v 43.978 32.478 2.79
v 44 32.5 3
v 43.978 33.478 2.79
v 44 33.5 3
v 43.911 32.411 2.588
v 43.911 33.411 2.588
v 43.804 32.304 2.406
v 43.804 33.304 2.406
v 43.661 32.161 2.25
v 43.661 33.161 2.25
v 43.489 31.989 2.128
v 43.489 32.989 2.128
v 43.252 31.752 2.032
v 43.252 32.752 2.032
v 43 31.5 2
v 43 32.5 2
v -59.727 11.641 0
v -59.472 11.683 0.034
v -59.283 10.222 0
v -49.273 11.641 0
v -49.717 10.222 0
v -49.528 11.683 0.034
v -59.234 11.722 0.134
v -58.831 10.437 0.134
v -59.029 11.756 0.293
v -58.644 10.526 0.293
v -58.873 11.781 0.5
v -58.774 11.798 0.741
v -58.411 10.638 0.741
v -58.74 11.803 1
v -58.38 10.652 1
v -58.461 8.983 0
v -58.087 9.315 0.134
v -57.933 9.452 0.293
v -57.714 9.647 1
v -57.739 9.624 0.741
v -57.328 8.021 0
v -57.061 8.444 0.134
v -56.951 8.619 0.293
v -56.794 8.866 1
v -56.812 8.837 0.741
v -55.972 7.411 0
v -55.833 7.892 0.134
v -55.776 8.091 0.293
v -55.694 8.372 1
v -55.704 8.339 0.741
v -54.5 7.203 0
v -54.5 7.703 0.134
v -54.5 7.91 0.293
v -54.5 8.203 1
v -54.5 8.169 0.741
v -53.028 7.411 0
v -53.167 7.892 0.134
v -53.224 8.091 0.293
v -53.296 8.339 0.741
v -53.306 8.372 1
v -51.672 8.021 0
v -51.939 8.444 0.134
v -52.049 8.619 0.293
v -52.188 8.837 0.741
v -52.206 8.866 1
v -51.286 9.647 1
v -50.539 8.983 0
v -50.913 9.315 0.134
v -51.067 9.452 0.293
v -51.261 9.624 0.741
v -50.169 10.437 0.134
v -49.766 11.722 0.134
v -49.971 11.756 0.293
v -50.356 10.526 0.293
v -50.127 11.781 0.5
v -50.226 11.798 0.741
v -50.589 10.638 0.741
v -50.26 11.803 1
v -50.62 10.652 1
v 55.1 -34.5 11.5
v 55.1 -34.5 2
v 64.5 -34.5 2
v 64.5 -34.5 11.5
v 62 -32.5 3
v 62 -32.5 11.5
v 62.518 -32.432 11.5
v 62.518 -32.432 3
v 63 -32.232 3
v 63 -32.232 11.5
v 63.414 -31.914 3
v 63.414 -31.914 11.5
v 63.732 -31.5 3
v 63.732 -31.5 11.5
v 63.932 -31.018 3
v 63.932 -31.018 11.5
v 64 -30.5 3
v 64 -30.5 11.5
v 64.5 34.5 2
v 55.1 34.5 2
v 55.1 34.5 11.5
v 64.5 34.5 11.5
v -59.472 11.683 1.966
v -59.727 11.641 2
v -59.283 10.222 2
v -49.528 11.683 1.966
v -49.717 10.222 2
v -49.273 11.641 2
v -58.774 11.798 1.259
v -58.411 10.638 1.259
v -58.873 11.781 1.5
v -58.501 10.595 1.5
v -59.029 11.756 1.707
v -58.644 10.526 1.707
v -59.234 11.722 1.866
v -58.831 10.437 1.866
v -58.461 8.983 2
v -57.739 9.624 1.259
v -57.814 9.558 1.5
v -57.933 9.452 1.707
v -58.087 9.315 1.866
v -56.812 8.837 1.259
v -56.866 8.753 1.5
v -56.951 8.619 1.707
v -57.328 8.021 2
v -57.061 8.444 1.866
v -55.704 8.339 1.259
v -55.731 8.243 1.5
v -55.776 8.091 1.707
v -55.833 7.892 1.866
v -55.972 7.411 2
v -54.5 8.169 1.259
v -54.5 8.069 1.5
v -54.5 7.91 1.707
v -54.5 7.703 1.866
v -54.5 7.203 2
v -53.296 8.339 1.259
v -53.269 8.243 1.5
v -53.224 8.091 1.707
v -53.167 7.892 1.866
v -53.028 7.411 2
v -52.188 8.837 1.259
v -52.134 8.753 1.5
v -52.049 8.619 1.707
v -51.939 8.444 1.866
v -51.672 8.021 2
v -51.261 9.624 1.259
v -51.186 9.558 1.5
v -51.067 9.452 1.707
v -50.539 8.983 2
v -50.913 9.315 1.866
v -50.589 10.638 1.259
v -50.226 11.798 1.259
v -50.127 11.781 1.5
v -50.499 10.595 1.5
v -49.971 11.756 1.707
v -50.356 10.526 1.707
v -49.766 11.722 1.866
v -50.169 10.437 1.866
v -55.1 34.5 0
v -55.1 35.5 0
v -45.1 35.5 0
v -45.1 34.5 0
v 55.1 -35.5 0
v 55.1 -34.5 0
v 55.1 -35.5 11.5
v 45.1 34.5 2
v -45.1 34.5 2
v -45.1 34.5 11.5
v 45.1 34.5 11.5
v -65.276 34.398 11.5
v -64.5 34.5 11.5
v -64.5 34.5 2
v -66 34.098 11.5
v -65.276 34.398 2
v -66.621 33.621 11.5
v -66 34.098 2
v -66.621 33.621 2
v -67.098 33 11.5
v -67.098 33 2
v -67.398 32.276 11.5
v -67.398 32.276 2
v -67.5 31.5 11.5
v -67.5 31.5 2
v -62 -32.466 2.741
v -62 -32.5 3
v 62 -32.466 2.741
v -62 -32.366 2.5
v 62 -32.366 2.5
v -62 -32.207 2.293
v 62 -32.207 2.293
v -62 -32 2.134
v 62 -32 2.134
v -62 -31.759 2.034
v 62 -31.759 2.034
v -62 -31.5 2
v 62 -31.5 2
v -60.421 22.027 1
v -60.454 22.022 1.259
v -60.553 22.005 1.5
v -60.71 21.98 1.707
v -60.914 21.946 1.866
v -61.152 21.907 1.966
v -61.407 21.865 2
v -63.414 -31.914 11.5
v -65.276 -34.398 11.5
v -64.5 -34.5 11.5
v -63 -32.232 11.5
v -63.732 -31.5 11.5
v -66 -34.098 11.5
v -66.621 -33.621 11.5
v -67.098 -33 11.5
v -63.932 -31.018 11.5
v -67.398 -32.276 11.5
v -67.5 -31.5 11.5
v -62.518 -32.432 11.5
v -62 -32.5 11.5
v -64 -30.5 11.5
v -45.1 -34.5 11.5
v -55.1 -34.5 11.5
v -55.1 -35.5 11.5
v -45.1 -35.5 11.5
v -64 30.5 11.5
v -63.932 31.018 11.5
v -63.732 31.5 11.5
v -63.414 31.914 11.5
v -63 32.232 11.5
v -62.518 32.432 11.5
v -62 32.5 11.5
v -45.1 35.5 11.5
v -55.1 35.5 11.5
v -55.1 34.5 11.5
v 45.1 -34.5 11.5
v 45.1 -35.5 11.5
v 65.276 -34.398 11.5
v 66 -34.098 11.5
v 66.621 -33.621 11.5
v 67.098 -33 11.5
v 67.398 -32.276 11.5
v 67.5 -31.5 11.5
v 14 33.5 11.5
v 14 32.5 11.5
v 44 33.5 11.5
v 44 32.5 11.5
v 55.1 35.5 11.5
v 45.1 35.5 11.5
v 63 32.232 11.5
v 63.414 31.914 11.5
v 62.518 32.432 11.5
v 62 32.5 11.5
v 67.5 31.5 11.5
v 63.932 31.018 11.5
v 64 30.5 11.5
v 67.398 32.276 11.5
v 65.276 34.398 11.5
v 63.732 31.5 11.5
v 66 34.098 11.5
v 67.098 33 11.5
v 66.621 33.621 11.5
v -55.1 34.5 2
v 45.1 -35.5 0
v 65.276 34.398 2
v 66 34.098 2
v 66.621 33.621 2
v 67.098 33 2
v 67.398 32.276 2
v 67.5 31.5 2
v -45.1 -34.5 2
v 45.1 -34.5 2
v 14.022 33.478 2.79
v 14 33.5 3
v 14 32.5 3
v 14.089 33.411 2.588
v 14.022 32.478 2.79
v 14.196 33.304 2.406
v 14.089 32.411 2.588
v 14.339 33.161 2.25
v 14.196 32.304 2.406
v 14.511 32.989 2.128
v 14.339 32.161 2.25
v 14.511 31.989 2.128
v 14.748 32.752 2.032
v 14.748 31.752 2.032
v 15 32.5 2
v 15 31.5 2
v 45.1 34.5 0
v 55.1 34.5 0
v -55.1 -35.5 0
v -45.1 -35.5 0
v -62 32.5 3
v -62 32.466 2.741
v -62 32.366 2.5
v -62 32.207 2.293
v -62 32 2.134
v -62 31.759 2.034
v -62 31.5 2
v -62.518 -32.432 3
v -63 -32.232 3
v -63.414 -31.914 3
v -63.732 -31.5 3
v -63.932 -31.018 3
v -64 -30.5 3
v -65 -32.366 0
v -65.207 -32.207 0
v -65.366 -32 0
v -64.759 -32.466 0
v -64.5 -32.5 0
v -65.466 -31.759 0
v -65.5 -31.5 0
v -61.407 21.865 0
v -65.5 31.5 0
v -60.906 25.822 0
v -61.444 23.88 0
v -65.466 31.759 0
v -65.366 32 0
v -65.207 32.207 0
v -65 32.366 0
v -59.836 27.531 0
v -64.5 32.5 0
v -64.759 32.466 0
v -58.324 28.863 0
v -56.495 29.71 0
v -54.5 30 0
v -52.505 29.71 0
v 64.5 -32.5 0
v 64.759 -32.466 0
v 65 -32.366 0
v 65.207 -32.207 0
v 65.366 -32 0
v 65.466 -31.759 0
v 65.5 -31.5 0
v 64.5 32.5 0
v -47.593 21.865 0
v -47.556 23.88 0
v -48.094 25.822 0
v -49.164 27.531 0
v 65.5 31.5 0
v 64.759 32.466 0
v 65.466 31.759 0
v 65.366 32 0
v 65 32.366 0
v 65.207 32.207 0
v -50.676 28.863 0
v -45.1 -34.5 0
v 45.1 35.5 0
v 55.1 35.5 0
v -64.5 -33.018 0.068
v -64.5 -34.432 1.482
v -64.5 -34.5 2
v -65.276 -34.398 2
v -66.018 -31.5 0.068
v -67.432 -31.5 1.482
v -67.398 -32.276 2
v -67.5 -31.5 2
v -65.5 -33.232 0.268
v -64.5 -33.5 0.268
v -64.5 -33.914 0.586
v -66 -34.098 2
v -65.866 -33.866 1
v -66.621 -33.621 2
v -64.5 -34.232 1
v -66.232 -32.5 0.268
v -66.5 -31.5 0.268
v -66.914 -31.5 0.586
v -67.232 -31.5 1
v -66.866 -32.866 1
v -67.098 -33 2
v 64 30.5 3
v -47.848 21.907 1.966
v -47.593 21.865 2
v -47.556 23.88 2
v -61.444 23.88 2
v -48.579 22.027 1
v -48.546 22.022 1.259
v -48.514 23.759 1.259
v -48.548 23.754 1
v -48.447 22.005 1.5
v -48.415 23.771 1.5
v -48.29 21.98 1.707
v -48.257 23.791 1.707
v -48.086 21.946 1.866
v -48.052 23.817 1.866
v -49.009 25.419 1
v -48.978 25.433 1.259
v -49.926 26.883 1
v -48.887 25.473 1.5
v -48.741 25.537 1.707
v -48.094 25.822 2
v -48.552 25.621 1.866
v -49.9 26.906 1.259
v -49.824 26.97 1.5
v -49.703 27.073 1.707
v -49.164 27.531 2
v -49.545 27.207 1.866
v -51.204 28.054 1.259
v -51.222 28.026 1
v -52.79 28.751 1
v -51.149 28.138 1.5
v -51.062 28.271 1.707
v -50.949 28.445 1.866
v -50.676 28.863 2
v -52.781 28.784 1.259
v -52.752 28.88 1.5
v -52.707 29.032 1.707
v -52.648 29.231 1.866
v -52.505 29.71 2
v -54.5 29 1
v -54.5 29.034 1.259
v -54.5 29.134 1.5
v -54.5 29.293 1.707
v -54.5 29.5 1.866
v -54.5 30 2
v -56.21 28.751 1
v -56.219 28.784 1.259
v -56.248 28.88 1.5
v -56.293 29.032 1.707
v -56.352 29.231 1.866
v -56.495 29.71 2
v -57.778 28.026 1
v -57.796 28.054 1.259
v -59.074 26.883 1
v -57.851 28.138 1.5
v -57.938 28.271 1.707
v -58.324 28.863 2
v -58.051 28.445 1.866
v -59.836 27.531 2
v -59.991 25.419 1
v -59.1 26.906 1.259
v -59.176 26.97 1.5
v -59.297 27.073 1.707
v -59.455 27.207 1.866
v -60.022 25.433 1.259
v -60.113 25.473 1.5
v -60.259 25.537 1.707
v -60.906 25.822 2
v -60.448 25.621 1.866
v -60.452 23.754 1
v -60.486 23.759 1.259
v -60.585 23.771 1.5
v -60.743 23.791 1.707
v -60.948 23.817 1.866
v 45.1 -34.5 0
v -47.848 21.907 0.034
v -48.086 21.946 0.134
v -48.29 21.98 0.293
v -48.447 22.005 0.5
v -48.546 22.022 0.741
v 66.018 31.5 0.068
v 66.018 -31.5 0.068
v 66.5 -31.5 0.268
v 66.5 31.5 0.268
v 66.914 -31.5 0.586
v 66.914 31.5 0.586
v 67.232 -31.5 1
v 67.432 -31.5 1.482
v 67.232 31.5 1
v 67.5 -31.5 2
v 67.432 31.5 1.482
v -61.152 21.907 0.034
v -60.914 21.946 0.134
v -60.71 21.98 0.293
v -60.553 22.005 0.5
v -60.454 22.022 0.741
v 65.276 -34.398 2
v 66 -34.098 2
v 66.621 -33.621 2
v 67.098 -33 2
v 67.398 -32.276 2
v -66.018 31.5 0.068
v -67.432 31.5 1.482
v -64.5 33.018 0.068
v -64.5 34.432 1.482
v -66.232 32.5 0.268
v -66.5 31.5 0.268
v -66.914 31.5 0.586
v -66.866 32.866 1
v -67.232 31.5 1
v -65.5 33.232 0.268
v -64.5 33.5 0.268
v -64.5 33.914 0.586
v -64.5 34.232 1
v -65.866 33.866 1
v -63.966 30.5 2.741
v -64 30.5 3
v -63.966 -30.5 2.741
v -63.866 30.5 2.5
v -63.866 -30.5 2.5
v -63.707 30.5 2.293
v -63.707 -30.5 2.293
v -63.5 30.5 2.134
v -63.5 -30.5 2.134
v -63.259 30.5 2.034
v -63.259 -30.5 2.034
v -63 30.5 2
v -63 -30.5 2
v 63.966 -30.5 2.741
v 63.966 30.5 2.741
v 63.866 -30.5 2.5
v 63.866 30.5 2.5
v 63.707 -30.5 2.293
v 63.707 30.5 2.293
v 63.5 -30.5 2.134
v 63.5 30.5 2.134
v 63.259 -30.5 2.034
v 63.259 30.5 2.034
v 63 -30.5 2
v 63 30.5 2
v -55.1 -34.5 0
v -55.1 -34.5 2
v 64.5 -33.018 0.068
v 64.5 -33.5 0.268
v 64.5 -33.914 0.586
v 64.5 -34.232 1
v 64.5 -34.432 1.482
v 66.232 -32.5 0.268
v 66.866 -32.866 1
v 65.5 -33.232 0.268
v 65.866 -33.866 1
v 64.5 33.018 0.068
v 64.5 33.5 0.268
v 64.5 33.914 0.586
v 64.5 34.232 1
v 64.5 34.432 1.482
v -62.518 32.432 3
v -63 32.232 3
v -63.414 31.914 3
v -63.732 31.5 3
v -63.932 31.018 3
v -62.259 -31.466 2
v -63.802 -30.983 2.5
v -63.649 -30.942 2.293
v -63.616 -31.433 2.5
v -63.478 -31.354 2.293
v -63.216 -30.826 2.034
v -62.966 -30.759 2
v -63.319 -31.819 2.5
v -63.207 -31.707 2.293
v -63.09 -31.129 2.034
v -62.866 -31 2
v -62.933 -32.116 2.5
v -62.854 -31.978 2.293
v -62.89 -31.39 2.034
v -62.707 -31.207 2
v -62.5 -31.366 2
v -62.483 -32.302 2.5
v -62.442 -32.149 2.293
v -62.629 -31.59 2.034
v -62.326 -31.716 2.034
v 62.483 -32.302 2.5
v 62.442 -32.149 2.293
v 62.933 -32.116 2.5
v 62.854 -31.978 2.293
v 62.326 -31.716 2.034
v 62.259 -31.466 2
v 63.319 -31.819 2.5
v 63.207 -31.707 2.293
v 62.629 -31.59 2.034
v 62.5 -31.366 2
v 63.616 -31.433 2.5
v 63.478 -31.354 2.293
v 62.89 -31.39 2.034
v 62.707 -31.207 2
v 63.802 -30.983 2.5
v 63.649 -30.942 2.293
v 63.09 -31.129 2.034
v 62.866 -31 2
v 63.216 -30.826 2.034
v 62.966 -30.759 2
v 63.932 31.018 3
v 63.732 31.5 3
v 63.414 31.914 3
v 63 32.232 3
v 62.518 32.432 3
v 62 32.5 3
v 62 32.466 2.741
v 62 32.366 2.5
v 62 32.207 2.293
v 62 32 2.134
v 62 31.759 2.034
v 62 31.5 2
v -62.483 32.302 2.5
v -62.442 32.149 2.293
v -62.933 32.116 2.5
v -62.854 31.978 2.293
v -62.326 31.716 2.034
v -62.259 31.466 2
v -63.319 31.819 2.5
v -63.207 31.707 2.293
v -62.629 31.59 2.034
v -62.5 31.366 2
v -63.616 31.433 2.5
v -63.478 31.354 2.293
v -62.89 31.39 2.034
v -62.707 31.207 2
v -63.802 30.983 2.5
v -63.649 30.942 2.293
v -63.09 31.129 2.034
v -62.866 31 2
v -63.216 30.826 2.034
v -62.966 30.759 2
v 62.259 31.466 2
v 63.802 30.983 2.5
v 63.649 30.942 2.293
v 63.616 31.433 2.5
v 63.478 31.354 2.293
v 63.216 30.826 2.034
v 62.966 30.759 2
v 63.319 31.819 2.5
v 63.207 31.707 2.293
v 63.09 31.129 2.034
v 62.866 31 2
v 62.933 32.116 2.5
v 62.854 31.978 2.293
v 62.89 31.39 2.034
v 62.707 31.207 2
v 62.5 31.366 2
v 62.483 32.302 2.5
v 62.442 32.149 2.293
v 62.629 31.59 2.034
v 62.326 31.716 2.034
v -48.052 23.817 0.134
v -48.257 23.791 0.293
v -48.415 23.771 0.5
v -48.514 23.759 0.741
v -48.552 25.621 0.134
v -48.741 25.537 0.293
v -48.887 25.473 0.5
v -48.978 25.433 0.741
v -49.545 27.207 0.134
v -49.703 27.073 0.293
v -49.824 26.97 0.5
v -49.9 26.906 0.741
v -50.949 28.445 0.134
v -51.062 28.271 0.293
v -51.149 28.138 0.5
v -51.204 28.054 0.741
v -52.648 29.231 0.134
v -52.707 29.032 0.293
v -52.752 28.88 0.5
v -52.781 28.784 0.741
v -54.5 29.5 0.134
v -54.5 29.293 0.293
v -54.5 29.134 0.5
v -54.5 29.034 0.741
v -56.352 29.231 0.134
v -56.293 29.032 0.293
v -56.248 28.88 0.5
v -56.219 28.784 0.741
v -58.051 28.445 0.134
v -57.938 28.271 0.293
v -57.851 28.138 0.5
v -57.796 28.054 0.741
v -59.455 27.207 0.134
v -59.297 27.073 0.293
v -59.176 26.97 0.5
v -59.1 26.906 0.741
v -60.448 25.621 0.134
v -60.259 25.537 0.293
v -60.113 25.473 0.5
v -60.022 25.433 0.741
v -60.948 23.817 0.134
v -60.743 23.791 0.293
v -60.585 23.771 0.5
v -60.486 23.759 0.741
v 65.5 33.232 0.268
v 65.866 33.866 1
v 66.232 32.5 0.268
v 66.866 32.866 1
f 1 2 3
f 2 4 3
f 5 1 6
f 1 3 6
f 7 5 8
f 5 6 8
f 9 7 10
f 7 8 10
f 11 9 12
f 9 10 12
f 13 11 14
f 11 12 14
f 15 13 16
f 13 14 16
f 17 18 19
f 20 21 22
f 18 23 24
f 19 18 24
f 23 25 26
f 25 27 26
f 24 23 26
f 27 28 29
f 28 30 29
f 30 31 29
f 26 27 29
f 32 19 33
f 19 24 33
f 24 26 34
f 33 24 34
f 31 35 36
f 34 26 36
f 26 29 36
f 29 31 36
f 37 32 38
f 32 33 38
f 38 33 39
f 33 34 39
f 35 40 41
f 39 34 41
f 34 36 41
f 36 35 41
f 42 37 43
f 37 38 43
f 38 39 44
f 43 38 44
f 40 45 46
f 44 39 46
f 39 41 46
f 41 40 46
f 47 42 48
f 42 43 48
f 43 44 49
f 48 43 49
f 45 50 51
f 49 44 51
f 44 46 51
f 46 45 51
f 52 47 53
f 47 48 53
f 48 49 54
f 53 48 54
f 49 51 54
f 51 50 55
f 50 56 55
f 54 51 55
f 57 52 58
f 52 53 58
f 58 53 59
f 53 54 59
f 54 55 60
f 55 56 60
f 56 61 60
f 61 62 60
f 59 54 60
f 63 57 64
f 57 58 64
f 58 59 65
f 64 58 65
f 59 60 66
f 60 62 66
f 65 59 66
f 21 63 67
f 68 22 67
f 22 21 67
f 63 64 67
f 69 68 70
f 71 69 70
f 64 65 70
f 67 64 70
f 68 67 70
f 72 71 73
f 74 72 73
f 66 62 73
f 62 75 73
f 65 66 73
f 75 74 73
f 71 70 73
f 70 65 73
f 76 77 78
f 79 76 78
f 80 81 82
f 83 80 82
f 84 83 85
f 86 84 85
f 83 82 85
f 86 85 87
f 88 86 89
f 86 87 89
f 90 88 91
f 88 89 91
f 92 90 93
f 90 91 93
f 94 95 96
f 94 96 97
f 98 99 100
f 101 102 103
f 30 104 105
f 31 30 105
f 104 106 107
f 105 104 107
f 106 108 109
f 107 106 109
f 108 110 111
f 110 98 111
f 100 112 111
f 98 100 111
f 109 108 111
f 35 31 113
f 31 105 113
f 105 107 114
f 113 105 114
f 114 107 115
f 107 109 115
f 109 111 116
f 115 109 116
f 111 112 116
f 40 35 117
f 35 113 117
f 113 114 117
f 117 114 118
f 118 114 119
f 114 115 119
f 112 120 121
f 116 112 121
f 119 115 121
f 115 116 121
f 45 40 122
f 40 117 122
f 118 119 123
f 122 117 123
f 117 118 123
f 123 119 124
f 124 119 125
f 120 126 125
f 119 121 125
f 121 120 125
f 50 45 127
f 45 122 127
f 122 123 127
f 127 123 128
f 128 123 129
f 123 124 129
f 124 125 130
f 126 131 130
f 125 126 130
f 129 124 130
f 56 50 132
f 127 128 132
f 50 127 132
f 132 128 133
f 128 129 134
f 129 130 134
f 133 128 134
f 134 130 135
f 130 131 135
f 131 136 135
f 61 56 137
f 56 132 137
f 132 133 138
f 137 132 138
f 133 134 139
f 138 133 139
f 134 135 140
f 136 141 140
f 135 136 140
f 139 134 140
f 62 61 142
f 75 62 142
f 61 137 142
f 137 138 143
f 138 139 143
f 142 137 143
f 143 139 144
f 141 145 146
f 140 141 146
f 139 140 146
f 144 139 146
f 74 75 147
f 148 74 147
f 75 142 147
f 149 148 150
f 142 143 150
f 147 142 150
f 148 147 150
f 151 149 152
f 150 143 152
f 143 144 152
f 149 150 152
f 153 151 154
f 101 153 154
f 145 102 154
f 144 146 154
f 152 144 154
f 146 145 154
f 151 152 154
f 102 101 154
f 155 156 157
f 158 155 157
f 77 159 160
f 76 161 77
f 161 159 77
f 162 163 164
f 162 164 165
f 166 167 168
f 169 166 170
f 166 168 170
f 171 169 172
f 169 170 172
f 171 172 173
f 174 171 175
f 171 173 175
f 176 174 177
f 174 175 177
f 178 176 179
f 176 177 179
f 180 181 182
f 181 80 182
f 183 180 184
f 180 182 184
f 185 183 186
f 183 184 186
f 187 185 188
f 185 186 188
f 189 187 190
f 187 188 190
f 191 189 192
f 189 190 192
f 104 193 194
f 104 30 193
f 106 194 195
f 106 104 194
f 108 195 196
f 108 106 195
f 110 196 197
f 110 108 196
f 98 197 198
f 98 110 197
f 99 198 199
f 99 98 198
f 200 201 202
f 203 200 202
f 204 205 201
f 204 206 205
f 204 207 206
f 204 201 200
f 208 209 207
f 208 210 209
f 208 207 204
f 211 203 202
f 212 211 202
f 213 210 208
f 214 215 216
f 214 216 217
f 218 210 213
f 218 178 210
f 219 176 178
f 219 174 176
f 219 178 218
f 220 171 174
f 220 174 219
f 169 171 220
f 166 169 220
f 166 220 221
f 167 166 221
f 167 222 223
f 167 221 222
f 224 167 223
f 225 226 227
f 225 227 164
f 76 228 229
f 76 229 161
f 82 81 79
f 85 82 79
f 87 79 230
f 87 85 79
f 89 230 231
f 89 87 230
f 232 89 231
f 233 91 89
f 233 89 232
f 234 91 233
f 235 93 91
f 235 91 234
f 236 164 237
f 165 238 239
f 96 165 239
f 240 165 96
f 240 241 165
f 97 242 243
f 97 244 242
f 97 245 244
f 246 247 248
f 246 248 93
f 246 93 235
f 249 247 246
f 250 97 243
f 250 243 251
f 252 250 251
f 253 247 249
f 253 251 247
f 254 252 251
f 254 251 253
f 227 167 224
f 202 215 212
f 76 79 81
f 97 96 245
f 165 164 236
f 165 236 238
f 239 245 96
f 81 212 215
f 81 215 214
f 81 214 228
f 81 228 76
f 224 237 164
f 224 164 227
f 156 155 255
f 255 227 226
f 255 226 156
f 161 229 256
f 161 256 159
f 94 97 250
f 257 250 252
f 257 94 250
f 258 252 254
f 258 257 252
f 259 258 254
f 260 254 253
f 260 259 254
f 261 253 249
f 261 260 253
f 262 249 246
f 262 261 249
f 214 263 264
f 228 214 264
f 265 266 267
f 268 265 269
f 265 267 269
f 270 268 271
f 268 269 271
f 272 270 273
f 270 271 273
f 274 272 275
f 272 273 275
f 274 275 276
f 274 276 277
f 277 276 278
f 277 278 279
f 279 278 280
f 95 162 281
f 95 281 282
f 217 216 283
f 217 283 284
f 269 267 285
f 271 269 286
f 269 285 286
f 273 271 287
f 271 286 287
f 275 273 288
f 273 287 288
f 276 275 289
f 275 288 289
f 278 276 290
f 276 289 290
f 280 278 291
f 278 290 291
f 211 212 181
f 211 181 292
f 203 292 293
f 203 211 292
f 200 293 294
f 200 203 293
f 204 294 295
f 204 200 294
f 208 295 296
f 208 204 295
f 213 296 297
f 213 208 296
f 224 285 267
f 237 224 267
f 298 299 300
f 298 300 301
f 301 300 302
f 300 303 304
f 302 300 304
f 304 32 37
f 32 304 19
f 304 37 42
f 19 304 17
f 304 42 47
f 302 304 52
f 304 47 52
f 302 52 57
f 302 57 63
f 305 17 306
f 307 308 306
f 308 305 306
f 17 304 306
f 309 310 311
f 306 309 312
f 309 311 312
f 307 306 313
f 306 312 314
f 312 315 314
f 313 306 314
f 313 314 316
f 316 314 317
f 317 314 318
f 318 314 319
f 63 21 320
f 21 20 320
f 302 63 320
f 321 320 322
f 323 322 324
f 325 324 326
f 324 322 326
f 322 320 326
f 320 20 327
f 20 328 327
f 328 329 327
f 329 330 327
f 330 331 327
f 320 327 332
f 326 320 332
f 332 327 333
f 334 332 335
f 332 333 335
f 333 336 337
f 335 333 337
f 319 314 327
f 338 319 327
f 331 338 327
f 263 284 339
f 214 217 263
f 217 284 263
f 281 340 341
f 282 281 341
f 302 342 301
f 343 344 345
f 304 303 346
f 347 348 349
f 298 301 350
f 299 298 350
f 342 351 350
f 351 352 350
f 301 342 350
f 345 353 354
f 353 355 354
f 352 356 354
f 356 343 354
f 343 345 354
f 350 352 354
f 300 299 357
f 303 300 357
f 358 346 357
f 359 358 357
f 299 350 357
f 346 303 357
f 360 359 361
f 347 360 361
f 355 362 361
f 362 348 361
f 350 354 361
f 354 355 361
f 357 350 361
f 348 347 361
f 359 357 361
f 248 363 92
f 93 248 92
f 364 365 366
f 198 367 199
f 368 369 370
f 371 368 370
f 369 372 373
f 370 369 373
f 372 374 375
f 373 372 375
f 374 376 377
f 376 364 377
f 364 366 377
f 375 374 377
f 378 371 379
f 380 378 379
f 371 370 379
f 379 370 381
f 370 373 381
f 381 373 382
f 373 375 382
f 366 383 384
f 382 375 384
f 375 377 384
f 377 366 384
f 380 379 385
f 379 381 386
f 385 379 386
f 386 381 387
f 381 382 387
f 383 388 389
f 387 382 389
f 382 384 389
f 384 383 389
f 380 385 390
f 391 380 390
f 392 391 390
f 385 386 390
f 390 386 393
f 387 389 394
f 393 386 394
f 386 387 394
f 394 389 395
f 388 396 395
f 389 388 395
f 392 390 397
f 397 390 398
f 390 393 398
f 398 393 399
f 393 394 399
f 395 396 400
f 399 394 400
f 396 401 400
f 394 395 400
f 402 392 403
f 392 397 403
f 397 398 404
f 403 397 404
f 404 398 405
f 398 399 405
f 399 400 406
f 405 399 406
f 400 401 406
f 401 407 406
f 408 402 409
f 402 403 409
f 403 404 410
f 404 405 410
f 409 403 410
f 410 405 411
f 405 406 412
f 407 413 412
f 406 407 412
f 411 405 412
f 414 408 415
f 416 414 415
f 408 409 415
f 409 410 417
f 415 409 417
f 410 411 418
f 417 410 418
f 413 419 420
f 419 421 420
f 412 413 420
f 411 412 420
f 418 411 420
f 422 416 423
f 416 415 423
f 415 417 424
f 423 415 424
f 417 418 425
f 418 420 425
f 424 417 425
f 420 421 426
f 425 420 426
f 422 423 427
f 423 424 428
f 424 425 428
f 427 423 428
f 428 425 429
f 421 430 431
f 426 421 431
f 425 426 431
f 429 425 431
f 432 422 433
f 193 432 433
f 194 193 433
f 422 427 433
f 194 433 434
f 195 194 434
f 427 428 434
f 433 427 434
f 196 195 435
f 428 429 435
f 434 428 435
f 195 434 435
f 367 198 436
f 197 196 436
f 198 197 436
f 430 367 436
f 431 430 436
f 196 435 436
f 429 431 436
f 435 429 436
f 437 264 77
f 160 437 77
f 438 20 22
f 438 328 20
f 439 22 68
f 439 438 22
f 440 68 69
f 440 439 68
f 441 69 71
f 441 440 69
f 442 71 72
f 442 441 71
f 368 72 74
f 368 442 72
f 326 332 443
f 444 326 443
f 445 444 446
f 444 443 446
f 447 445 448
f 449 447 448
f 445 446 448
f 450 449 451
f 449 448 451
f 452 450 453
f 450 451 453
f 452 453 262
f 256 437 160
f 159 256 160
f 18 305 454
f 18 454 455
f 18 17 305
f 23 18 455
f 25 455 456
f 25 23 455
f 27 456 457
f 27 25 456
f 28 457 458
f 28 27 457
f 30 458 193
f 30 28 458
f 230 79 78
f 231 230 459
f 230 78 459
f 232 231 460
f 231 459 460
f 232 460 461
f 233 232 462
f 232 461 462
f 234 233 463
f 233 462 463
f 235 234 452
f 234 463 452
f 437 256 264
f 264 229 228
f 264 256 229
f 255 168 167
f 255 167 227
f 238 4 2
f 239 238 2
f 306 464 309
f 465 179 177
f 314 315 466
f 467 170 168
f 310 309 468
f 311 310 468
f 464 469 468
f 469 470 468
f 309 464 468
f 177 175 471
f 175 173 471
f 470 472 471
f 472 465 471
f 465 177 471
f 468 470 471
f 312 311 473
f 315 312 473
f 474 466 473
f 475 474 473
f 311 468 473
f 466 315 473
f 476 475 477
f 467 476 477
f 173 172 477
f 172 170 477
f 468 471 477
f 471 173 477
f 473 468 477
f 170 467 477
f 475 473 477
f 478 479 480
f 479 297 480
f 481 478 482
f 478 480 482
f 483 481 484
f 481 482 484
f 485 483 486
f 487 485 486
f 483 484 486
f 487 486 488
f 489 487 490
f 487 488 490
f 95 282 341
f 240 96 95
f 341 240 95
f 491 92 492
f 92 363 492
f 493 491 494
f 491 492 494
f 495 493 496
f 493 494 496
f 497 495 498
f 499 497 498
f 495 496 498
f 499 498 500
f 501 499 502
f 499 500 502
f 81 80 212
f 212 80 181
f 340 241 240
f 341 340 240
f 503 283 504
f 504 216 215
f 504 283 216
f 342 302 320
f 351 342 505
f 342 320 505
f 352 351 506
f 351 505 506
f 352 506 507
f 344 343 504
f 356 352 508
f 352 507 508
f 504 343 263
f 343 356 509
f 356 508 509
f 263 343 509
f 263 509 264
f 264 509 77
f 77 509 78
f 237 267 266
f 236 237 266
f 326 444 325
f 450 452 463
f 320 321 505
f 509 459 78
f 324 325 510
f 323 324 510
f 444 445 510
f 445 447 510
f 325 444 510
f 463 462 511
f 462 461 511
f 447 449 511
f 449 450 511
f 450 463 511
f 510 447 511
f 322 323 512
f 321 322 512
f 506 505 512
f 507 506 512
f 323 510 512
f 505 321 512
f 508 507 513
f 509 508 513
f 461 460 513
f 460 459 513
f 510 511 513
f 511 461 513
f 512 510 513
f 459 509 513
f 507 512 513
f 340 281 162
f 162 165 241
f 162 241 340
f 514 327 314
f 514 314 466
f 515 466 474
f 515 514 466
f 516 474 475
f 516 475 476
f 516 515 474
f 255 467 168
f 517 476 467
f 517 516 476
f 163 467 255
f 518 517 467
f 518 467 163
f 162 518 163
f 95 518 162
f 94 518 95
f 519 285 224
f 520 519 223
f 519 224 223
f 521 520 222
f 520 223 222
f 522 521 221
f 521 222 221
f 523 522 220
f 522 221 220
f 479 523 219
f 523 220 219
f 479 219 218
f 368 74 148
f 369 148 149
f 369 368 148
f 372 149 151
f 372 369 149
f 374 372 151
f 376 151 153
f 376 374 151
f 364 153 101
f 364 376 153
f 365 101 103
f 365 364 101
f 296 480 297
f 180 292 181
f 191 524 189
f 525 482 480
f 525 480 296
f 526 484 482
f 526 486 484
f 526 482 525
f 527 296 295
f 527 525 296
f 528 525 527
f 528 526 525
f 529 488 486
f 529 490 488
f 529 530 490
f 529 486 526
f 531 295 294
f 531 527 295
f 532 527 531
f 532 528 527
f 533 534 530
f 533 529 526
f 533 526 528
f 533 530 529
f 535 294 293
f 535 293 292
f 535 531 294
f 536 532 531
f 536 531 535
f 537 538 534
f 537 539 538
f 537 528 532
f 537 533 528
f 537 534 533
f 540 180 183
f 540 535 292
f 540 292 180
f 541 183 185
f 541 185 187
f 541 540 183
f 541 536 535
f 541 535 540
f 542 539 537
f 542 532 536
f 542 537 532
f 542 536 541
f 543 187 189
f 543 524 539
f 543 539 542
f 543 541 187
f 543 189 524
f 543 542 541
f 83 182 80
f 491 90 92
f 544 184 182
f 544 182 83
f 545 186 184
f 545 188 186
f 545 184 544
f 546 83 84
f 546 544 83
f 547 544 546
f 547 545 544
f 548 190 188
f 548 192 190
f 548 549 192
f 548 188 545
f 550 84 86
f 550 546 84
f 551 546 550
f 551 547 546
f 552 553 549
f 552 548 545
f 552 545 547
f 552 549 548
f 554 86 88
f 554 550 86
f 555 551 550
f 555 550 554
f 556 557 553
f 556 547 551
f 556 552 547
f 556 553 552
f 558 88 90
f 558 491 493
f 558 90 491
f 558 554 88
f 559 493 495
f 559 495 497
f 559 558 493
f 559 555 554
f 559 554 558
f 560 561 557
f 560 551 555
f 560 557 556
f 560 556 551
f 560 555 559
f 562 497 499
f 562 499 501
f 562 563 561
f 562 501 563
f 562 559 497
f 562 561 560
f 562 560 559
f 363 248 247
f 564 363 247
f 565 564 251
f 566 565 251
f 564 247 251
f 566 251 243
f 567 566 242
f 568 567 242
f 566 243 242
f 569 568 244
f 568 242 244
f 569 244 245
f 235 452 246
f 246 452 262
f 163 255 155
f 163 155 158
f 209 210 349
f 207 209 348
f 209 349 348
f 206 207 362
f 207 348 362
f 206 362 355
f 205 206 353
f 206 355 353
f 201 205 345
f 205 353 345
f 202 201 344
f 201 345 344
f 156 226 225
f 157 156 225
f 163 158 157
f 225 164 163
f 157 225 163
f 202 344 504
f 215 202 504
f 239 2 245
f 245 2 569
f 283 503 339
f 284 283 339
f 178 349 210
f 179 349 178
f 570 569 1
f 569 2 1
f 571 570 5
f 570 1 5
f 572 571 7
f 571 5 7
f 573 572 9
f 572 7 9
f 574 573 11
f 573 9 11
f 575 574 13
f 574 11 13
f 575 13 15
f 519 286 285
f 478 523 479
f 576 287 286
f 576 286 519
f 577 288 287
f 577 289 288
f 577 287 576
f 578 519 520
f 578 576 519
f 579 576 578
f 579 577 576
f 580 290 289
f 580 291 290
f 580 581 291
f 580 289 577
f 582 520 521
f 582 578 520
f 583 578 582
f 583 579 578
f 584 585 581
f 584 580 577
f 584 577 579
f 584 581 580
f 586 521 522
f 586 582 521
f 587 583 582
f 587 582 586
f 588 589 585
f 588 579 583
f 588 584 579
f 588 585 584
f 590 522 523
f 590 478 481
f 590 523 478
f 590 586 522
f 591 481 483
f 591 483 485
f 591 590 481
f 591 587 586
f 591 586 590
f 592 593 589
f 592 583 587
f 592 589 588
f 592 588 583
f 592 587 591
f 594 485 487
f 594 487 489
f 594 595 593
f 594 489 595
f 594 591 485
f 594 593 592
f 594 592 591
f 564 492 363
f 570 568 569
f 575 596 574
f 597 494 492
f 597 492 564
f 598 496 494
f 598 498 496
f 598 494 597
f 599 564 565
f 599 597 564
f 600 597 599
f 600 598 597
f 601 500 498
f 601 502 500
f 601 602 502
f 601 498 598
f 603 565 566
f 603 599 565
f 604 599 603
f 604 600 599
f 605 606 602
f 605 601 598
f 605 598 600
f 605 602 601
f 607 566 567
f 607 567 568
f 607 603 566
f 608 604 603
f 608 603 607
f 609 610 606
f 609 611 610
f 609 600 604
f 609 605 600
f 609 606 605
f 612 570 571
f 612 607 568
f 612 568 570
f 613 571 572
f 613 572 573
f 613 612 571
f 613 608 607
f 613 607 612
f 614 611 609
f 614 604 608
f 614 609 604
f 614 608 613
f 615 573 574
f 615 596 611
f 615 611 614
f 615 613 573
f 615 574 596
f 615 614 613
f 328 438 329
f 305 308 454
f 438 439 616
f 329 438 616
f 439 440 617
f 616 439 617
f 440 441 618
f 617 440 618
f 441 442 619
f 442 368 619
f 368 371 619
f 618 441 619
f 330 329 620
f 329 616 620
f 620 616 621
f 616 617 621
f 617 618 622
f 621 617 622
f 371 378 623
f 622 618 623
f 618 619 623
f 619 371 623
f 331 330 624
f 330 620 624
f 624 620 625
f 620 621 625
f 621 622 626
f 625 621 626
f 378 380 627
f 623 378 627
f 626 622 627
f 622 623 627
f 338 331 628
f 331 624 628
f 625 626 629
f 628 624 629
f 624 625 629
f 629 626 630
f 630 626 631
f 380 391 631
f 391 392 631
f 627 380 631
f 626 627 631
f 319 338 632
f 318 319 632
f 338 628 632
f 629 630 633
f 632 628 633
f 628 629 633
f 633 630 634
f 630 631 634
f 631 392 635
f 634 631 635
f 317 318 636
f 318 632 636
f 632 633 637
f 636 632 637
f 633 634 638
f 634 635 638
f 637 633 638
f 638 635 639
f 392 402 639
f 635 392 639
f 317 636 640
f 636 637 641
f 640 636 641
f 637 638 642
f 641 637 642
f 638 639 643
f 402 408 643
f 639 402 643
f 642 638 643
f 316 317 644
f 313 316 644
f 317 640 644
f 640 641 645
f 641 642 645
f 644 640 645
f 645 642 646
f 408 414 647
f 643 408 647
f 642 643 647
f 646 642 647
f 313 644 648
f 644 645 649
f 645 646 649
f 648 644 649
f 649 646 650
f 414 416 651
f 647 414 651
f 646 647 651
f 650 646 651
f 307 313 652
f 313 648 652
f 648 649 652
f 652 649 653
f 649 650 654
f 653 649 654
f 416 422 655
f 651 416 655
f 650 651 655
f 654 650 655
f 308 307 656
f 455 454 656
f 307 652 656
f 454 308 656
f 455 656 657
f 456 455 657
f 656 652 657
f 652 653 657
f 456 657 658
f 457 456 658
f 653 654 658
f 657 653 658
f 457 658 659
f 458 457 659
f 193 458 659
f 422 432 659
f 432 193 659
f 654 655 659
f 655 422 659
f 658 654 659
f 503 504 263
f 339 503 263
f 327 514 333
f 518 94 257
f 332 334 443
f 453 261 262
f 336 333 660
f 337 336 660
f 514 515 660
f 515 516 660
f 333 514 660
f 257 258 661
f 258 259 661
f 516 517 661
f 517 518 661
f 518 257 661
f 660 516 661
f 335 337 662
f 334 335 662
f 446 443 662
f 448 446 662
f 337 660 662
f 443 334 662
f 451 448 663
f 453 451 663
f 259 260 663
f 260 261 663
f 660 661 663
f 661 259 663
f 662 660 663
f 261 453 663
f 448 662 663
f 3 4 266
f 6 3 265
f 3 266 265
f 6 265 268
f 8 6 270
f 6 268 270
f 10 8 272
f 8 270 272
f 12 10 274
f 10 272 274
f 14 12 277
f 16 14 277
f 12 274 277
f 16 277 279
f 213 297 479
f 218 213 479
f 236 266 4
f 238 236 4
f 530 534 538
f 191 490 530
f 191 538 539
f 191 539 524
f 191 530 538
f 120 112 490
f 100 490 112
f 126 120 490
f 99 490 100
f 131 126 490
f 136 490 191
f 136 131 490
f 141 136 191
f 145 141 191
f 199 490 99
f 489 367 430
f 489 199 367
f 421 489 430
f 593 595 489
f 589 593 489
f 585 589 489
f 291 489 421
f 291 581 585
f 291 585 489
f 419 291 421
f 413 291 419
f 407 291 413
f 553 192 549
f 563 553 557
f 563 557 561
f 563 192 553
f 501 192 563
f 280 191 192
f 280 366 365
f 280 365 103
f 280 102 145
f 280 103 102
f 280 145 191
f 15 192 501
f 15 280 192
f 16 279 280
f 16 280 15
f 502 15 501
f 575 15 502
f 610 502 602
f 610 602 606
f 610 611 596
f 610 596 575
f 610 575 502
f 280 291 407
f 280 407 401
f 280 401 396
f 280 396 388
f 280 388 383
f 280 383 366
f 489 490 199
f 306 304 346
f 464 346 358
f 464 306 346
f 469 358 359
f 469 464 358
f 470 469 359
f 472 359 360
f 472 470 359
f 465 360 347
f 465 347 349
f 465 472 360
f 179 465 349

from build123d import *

# Parameters (mm, degrees)
F0_W         = 135
F0_H         = 69
F1_DEPTH     = 11.5
F2_DEPTH     = 2
F3_R         = 2
F4_R         = 2
F5_R         = 1
F6_T1_DEPTH  = 19
F6_T4_ANGLE  = 90
F6_T6_ANGLE  = 90
F6_T8_ANGLE  = 90
F6_T10_ANGLE = 90
F7_W         = 10
F7_H         = 1
F8_DEPTH     = 11.5
F10_DEPTH    = 25
F11_R        = 0.99999


# Not quite as in the source:
# - a fillet or chamfer that OpenCascade refuses, or shapes differently, is made with other operations: its cross-section is extruded or revolved along the edge and cut away or added
# - a fillet or chamfer is up to 0.001 mm smaller than in the source, because OpenCascade refuses the exact size
# - a feature of the source that left no trace in its solid (it failed there, or was rolled back) is left out


with BuildPart() as f1:
    # F0 (on Top) → F1 (new body)
    with BuildSketch(Plane.XY):
        Rectangle(F0_W, F0_H)
        Polygon((-64, -32.5), (-64, 32.5), (14, 32.5), (14, 33.5), (44, 33.5), (44, 32.5), (64, 32.5), (64, -32.5), align=None, mode=Mode.SUBTRACT)
    extrude(amount=F1_DEPTH)

    # F0 (on Top) → F2 (join)
    with BuildSketch(Plane.XY):
        Polygon((14, 32.5), (-64, 32.5), (-64, -32.5), (64, -32.5), (64, 32.5), (44, 32.5), (44, 33.5), (14, 33.5), align=None)
    extrude(amount=F2_DEPTH)

    # F3
    f3_edges = [f1.edges().sort_by_distance(p)[0] for p in [
        (0, 34.5, 0),
        (-67.5, 0, 0),
        (0, -34.5, 0),
        (67.5, 0, 0),
    ]]
    fillet(f3_edges, radius=F3_R)

    # F4
    f4_edges = [f1.edges().sort_by_distance(p)[0] for p in [
        (-64, 32.5, 6.75),
        (64, 32.5, 6.75),
        (64, -32.5, 6.75),
        (-64, -32.5, 6.75),
    ]]
    fillet(f4_edges, radius=F4_R)

    # F5
    f5_edges = [f1.edges().sort_by_distance(p)[0] for p in [
        (-24, 32.5, 2),
        (-63.414214, 31.914214, 2),
        (14, 33, 2),
        (-64, 0, 2),
        (29, 33.5, 2),
        (-63.414214, -31.914214, 2),
        (44, 33, 2),
        (0, -32.5, 2),
        (53, 32.5, 2),
        (63.414214, -31.914214, 2),
        (63.414214, 31.914214, 2),
        (64, 0, 2),
    ]]
    fillet(f5_edges, radius=F5_R)

    # F6: fillet of radius 3 on 4 edges, made by hand

    # F6_s2 → F6_t1 (cut)
    with BuildSketch(Plane.XY):
        with BuildLine():
            ThreePointArc((-64.5, 34.5), (-66.6213203436, 33.6213203436), (-67.5, 31.5))
            Line((-67.5, 31.5), (-67.5, 34.5))
            Line((-67.5, 34.5), (-64.5, 34.5))
        make_face()
        with BuildLine():
            ThreePointArc((-67.5, -31.5), (-66.6213203436, -33.6213203436), (-64.5, -34.5))
            Line((-64.5, -34.5), (-67.5, -34.5))
            Line((-67.5, -34.5), (-67.5, -31.5))
        make_face()
        with BuildLine():
            ThreePointArc((64.5, -34.5), (66.6213203436, -33.6213203436), (67.5, -31.5))
            Line((67.5, -31.5), (67.5, -34.5))
            Line((67.5, -34.5), (64.5, -34.5))
        make_face()
        with BuildLine():
            ThreePointArc((64.5, 34.5), (66.6213203436, 33.6213203436), (67.5, 31.5))
            Line((67.5, 31.5), (67.5, 34.5))
            Line((67.5, 34.5), (64.5, 34.5))
        make_face()
    extrude(amount=F6_T1_DEPTH, mode=Mode.SUBTRACT)

    # F6_s3 → F6_t4 (revolve, cut)
    with BuildSketch(Plane.YZ.offset(64.5)):
        with BuildLine():
            ThreePointArc((32.5, 0), (33.9142135624, 0.5857864376), (34.5, 2))
            Line((34.5, 2), (34.5, 0))
            Line((34.5, 0), (32.5, 0))
        make_face()
    revolve(axis=Axis((64.5, 31.5, 0), (0, 0, -1)), revolution_arc=F6_T4_ANGLE, mode=Mode.SUBTRACT)

    # F6_s5 → F6_t6 (revolve, cut)
    with BuildSketch(Plane.XZ.offset(31.5)):
        with BuildLine():
            ThreePointArc((65.5, 0), (66.9142135624, 0.5857864376), (67.5, 2))
            Line((67.5, 2), (67.5, 0))
            Line((67.5, 0), (65.5, 0))
        make_face()
    revolve(axis=Axis((64.5, -31.5, 0), (0, 0, -1)), revolution_arc=F6_T6_ANGLE, mode=Mode.SUBTRACT)

    # F6_s7 → F6_t8 (revolve, cut)
    with BuildSketch(Plane.YZ.offset(-64.5)):
        with BuildLine():
            ThreePointArc((-32.5, 0), (-33.9142135624, 0.5857864376), (-34.5, 2))
            Line((-34.5, 2), (-34.5, 0))
            Line((-34.5, 0), (-32.5, 0))
        make_face()
    revolve(axis=Axis((-64.5, -31.5, 0), (0, 0, -1)), revolution_arc=F6_T8_ANGLE, mode=Mode.SUBTRACT)

    # F6_s9 → F6_t10 (revolve, cut)
    with BuildSketch(Plane.XZ.offset(-31.5)):
        with BuildLine():
            ThreePointArc((-65.5, 0), (-66.9142135624, 0.5857864376), (-67.5, 2))
            Line((-67.5, 2), (-67.5, 0))
            Line((-67.5, 0), (-65.5, 0))
        make_face()
    revolve(axis=Axis((-64.5, 31.5, 0), (0, 0, -1)), revolution_arc=F6_T10_ANGLE, mode=Mode.SUBTRACT)

    # F7 (on face) → F8 (join, through all)
    with BuildSketch(Plane.XY.offset(11.5)):
        with Locations((-50.1, 35)):
            Rectangle(F7_W, F7_H)
        with Locations((50.1, 35)):
            Rectangle(F7_W, F7_H)
        with Locations((-50.1, -35)):
            Rectangle(F7_W, F7_H)
        with Locations((50.1, -35)):
            Rectangle(F7_W, F7_H)
    extrude(amount=-F8_DEPTH)

    # F9 (on face) → F10 (cut)
    with BuildSketch(Plane.XY.offset(2)):
        with BuildLine():
            Line((-50.2595349939, 11.8031518124), (-48.5794111489, 22.0270520794))
            ThreePointArc((-48.5794111489, 22.0270520794), (-54.5, 29), (-60.4205888511, 22.0270520794))
            Line((-60.4205888511, 22.0270520794), (-58.7404650061, 11.8031518124))
            ThreePointArc((-58.7404650061, 11.8031518124), (-54.5, 8.2026588611), (-50.2595349939, 11.8031518124))
        make_face()
    extrude(amount=-F10_DEPTH, mode=Mode.SUBTRACT)

    # F11 (radius 1 in the source; OpenCascade refuses exactly that, so slightly less here)
    f11_edges = [f1.edges().sort_by_distance(p)[0] for p in [
        (-54.5, 29, 2),
        (-49.419473, 16.915102, 0),
        (-54.5, 8.202659, 2),
        (-49.419473, 16.915102, 2),
        (-59.580527, 16.915102, 2),
        (-54.5, 8.202659, 0),
        (-54.5, 29, 0),
        (-59.580527, 16.915102, 0),
    ]]
    fillet(f11_edges, radius=F11_R)


solid = f1.part
